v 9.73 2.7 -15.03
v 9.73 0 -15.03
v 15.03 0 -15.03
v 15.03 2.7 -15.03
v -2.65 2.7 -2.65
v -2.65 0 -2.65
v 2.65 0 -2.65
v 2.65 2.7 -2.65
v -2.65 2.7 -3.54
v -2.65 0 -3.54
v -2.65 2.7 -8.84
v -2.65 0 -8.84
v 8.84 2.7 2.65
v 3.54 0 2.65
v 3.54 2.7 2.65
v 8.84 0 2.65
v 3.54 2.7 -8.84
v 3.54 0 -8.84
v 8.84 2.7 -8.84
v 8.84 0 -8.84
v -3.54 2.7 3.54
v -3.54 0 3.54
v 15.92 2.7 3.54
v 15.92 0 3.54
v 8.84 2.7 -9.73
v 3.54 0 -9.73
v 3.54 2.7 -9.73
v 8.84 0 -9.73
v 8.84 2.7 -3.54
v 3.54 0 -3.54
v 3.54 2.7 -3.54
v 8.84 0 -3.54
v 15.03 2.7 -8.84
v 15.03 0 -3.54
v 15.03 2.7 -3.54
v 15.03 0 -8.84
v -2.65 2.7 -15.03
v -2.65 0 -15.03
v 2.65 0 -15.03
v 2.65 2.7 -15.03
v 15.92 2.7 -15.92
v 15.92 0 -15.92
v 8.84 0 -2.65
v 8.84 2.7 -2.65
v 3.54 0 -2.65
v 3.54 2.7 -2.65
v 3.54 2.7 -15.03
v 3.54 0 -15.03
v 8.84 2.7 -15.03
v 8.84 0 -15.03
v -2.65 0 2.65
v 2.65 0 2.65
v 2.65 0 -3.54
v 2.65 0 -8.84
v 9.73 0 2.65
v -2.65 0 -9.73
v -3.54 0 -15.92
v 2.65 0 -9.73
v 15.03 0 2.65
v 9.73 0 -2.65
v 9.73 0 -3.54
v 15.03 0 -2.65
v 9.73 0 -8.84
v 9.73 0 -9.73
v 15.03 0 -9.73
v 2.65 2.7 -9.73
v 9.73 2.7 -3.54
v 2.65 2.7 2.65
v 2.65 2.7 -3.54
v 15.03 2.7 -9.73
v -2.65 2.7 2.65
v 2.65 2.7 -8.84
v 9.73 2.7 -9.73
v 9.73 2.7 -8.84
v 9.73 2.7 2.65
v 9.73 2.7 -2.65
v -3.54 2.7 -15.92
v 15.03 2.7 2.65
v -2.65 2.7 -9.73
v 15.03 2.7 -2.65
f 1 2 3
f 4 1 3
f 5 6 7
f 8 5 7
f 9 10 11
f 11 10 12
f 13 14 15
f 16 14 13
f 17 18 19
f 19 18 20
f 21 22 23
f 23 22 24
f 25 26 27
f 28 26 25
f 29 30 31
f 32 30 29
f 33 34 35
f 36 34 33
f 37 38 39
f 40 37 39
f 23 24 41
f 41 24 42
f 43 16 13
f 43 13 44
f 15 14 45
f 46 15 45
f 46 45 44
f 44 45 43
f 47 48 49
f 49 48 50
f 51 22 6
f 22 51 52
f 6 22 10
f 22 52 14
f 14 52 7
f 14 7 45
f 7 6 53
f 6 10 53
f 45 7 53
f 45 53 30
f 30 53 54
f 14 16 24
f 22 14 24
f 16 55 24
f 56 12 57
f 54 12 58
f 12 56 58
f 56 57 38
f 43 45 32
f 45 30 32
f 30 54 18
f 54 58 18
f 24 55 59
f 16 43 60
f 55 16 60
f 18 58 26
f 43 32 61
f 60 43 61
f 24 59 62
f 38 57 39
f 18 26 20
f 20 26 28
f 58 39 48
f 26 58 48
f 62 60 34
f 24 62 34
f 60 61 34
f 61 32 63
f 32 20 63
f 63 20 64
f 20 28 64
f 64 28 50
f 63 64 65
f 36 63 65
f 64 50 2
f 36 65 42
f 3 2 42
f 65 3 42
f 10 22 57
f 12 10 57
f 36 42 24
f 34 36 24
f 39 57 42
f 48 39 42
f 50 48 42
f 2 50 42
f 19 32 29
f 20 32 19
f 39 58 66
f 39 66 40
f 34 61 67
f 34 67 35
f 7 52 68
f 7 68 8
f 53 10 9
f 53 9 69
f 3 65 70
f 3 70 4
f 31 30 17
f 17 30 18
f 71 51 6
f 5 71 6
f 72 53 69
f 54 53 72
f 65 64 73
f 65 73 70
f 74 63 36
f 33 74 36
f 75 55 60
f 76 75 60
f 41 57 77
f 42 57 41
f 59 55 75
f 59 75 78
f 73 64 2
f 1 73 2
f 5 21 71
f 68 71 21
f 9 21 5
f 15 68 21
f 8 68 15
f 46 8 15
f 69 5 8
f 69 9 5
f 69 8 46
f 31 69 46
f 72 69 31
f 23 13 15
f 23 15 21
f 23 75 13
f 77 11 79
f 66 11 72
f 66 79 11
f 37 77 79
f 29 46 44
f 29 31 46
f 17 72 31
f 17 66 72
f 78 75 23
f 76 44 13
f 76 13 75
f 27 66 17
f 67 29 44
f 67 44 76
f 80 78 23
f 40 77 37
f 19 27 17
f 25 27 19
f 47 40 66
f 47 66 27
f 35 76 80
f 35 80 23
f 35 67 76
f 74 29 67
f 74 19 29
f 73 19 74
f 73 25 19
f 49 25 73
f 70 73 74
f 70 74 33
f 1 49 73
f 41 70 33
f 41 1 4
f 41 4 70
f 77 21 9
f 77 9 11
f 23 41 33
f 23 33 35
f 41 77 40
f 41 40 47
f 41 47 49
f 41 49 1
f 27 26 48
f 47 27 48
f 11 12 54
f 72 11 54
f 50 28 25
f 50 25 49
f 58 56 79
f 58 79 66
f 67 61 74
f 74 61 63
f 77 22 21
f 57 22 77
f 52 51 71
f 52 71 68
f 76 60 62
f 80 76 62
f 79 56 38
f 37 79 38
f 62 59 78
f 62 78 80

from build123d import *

# Parameters (mm, degrees)
SKETCH1_W           = 19.46
SKETCH1_H           = 19.46
SKETCH1_W_2         = 5.3
SKETCH1_H_2         = 5.3
BOSS_EXTRUDE1_DEPTH = 2.7


with BuildPart() as part:
    # Sketch1 → Boss-Extrude1 (new body)
    with BuildSketch(Plane(origin=(0, 0, 0), x_dir=(1, 0, 0), z_dir=(0, 1, 0))):
        with Locations((6.19, 6.19)):
            Rectangle(SKETCH1_W, SKETCH1_H)
        with Locations((6.19, 0)):
            Rectangle(SKETCH1_W_2, SKETCH1_H_2, mode=Mode.SUBTRACT)
        Rectangle(SKETCH1_W_2, SKETCH1_H_2, mode=Mode.SUBTRACT)
        with Locations((12.38, 0)):
            Rectangle(SKETCH1_W_2, SKETCH1_H_2, mode=Mode.SUBTRACT)
        with Locations((6.19, 6.19)):
            Rectangle(SKETCH1_W_2, SKETCH1_H_2, mode=Mode.SUBTRACT)
        with Locations((12.38, 6.19)):
            Rectangle(SKETCH1_W_2, SKETCH1_H_2, mode=Mode.SUBTRACT)
        with Locations((6.19, 12.38)):
            Rectangle(SKETCH1_W_2, SKETCH1_H_2, mode=Mode.SUBTRACT)
        with Locations((12.38, 12.38)):
            Rectangle(SKETCH1_W_2, SKETCH1_H_2, mode=Mode.SUBTRACT)
        with Locations((0, 6.19)):
            Rectangle(SKETCH1_W_2, SKETCH1_H_2, mode=Mode.SUBTRACT)
        with Locations((0, 12.38)):
            Rectangle(SKETCH1_W_2, SKETCH1_H_2, mode=Mode.SUBTRACT)
    extrude(amount=BOSS_EXTRUDE1_DEPTH)


solid = part.part
